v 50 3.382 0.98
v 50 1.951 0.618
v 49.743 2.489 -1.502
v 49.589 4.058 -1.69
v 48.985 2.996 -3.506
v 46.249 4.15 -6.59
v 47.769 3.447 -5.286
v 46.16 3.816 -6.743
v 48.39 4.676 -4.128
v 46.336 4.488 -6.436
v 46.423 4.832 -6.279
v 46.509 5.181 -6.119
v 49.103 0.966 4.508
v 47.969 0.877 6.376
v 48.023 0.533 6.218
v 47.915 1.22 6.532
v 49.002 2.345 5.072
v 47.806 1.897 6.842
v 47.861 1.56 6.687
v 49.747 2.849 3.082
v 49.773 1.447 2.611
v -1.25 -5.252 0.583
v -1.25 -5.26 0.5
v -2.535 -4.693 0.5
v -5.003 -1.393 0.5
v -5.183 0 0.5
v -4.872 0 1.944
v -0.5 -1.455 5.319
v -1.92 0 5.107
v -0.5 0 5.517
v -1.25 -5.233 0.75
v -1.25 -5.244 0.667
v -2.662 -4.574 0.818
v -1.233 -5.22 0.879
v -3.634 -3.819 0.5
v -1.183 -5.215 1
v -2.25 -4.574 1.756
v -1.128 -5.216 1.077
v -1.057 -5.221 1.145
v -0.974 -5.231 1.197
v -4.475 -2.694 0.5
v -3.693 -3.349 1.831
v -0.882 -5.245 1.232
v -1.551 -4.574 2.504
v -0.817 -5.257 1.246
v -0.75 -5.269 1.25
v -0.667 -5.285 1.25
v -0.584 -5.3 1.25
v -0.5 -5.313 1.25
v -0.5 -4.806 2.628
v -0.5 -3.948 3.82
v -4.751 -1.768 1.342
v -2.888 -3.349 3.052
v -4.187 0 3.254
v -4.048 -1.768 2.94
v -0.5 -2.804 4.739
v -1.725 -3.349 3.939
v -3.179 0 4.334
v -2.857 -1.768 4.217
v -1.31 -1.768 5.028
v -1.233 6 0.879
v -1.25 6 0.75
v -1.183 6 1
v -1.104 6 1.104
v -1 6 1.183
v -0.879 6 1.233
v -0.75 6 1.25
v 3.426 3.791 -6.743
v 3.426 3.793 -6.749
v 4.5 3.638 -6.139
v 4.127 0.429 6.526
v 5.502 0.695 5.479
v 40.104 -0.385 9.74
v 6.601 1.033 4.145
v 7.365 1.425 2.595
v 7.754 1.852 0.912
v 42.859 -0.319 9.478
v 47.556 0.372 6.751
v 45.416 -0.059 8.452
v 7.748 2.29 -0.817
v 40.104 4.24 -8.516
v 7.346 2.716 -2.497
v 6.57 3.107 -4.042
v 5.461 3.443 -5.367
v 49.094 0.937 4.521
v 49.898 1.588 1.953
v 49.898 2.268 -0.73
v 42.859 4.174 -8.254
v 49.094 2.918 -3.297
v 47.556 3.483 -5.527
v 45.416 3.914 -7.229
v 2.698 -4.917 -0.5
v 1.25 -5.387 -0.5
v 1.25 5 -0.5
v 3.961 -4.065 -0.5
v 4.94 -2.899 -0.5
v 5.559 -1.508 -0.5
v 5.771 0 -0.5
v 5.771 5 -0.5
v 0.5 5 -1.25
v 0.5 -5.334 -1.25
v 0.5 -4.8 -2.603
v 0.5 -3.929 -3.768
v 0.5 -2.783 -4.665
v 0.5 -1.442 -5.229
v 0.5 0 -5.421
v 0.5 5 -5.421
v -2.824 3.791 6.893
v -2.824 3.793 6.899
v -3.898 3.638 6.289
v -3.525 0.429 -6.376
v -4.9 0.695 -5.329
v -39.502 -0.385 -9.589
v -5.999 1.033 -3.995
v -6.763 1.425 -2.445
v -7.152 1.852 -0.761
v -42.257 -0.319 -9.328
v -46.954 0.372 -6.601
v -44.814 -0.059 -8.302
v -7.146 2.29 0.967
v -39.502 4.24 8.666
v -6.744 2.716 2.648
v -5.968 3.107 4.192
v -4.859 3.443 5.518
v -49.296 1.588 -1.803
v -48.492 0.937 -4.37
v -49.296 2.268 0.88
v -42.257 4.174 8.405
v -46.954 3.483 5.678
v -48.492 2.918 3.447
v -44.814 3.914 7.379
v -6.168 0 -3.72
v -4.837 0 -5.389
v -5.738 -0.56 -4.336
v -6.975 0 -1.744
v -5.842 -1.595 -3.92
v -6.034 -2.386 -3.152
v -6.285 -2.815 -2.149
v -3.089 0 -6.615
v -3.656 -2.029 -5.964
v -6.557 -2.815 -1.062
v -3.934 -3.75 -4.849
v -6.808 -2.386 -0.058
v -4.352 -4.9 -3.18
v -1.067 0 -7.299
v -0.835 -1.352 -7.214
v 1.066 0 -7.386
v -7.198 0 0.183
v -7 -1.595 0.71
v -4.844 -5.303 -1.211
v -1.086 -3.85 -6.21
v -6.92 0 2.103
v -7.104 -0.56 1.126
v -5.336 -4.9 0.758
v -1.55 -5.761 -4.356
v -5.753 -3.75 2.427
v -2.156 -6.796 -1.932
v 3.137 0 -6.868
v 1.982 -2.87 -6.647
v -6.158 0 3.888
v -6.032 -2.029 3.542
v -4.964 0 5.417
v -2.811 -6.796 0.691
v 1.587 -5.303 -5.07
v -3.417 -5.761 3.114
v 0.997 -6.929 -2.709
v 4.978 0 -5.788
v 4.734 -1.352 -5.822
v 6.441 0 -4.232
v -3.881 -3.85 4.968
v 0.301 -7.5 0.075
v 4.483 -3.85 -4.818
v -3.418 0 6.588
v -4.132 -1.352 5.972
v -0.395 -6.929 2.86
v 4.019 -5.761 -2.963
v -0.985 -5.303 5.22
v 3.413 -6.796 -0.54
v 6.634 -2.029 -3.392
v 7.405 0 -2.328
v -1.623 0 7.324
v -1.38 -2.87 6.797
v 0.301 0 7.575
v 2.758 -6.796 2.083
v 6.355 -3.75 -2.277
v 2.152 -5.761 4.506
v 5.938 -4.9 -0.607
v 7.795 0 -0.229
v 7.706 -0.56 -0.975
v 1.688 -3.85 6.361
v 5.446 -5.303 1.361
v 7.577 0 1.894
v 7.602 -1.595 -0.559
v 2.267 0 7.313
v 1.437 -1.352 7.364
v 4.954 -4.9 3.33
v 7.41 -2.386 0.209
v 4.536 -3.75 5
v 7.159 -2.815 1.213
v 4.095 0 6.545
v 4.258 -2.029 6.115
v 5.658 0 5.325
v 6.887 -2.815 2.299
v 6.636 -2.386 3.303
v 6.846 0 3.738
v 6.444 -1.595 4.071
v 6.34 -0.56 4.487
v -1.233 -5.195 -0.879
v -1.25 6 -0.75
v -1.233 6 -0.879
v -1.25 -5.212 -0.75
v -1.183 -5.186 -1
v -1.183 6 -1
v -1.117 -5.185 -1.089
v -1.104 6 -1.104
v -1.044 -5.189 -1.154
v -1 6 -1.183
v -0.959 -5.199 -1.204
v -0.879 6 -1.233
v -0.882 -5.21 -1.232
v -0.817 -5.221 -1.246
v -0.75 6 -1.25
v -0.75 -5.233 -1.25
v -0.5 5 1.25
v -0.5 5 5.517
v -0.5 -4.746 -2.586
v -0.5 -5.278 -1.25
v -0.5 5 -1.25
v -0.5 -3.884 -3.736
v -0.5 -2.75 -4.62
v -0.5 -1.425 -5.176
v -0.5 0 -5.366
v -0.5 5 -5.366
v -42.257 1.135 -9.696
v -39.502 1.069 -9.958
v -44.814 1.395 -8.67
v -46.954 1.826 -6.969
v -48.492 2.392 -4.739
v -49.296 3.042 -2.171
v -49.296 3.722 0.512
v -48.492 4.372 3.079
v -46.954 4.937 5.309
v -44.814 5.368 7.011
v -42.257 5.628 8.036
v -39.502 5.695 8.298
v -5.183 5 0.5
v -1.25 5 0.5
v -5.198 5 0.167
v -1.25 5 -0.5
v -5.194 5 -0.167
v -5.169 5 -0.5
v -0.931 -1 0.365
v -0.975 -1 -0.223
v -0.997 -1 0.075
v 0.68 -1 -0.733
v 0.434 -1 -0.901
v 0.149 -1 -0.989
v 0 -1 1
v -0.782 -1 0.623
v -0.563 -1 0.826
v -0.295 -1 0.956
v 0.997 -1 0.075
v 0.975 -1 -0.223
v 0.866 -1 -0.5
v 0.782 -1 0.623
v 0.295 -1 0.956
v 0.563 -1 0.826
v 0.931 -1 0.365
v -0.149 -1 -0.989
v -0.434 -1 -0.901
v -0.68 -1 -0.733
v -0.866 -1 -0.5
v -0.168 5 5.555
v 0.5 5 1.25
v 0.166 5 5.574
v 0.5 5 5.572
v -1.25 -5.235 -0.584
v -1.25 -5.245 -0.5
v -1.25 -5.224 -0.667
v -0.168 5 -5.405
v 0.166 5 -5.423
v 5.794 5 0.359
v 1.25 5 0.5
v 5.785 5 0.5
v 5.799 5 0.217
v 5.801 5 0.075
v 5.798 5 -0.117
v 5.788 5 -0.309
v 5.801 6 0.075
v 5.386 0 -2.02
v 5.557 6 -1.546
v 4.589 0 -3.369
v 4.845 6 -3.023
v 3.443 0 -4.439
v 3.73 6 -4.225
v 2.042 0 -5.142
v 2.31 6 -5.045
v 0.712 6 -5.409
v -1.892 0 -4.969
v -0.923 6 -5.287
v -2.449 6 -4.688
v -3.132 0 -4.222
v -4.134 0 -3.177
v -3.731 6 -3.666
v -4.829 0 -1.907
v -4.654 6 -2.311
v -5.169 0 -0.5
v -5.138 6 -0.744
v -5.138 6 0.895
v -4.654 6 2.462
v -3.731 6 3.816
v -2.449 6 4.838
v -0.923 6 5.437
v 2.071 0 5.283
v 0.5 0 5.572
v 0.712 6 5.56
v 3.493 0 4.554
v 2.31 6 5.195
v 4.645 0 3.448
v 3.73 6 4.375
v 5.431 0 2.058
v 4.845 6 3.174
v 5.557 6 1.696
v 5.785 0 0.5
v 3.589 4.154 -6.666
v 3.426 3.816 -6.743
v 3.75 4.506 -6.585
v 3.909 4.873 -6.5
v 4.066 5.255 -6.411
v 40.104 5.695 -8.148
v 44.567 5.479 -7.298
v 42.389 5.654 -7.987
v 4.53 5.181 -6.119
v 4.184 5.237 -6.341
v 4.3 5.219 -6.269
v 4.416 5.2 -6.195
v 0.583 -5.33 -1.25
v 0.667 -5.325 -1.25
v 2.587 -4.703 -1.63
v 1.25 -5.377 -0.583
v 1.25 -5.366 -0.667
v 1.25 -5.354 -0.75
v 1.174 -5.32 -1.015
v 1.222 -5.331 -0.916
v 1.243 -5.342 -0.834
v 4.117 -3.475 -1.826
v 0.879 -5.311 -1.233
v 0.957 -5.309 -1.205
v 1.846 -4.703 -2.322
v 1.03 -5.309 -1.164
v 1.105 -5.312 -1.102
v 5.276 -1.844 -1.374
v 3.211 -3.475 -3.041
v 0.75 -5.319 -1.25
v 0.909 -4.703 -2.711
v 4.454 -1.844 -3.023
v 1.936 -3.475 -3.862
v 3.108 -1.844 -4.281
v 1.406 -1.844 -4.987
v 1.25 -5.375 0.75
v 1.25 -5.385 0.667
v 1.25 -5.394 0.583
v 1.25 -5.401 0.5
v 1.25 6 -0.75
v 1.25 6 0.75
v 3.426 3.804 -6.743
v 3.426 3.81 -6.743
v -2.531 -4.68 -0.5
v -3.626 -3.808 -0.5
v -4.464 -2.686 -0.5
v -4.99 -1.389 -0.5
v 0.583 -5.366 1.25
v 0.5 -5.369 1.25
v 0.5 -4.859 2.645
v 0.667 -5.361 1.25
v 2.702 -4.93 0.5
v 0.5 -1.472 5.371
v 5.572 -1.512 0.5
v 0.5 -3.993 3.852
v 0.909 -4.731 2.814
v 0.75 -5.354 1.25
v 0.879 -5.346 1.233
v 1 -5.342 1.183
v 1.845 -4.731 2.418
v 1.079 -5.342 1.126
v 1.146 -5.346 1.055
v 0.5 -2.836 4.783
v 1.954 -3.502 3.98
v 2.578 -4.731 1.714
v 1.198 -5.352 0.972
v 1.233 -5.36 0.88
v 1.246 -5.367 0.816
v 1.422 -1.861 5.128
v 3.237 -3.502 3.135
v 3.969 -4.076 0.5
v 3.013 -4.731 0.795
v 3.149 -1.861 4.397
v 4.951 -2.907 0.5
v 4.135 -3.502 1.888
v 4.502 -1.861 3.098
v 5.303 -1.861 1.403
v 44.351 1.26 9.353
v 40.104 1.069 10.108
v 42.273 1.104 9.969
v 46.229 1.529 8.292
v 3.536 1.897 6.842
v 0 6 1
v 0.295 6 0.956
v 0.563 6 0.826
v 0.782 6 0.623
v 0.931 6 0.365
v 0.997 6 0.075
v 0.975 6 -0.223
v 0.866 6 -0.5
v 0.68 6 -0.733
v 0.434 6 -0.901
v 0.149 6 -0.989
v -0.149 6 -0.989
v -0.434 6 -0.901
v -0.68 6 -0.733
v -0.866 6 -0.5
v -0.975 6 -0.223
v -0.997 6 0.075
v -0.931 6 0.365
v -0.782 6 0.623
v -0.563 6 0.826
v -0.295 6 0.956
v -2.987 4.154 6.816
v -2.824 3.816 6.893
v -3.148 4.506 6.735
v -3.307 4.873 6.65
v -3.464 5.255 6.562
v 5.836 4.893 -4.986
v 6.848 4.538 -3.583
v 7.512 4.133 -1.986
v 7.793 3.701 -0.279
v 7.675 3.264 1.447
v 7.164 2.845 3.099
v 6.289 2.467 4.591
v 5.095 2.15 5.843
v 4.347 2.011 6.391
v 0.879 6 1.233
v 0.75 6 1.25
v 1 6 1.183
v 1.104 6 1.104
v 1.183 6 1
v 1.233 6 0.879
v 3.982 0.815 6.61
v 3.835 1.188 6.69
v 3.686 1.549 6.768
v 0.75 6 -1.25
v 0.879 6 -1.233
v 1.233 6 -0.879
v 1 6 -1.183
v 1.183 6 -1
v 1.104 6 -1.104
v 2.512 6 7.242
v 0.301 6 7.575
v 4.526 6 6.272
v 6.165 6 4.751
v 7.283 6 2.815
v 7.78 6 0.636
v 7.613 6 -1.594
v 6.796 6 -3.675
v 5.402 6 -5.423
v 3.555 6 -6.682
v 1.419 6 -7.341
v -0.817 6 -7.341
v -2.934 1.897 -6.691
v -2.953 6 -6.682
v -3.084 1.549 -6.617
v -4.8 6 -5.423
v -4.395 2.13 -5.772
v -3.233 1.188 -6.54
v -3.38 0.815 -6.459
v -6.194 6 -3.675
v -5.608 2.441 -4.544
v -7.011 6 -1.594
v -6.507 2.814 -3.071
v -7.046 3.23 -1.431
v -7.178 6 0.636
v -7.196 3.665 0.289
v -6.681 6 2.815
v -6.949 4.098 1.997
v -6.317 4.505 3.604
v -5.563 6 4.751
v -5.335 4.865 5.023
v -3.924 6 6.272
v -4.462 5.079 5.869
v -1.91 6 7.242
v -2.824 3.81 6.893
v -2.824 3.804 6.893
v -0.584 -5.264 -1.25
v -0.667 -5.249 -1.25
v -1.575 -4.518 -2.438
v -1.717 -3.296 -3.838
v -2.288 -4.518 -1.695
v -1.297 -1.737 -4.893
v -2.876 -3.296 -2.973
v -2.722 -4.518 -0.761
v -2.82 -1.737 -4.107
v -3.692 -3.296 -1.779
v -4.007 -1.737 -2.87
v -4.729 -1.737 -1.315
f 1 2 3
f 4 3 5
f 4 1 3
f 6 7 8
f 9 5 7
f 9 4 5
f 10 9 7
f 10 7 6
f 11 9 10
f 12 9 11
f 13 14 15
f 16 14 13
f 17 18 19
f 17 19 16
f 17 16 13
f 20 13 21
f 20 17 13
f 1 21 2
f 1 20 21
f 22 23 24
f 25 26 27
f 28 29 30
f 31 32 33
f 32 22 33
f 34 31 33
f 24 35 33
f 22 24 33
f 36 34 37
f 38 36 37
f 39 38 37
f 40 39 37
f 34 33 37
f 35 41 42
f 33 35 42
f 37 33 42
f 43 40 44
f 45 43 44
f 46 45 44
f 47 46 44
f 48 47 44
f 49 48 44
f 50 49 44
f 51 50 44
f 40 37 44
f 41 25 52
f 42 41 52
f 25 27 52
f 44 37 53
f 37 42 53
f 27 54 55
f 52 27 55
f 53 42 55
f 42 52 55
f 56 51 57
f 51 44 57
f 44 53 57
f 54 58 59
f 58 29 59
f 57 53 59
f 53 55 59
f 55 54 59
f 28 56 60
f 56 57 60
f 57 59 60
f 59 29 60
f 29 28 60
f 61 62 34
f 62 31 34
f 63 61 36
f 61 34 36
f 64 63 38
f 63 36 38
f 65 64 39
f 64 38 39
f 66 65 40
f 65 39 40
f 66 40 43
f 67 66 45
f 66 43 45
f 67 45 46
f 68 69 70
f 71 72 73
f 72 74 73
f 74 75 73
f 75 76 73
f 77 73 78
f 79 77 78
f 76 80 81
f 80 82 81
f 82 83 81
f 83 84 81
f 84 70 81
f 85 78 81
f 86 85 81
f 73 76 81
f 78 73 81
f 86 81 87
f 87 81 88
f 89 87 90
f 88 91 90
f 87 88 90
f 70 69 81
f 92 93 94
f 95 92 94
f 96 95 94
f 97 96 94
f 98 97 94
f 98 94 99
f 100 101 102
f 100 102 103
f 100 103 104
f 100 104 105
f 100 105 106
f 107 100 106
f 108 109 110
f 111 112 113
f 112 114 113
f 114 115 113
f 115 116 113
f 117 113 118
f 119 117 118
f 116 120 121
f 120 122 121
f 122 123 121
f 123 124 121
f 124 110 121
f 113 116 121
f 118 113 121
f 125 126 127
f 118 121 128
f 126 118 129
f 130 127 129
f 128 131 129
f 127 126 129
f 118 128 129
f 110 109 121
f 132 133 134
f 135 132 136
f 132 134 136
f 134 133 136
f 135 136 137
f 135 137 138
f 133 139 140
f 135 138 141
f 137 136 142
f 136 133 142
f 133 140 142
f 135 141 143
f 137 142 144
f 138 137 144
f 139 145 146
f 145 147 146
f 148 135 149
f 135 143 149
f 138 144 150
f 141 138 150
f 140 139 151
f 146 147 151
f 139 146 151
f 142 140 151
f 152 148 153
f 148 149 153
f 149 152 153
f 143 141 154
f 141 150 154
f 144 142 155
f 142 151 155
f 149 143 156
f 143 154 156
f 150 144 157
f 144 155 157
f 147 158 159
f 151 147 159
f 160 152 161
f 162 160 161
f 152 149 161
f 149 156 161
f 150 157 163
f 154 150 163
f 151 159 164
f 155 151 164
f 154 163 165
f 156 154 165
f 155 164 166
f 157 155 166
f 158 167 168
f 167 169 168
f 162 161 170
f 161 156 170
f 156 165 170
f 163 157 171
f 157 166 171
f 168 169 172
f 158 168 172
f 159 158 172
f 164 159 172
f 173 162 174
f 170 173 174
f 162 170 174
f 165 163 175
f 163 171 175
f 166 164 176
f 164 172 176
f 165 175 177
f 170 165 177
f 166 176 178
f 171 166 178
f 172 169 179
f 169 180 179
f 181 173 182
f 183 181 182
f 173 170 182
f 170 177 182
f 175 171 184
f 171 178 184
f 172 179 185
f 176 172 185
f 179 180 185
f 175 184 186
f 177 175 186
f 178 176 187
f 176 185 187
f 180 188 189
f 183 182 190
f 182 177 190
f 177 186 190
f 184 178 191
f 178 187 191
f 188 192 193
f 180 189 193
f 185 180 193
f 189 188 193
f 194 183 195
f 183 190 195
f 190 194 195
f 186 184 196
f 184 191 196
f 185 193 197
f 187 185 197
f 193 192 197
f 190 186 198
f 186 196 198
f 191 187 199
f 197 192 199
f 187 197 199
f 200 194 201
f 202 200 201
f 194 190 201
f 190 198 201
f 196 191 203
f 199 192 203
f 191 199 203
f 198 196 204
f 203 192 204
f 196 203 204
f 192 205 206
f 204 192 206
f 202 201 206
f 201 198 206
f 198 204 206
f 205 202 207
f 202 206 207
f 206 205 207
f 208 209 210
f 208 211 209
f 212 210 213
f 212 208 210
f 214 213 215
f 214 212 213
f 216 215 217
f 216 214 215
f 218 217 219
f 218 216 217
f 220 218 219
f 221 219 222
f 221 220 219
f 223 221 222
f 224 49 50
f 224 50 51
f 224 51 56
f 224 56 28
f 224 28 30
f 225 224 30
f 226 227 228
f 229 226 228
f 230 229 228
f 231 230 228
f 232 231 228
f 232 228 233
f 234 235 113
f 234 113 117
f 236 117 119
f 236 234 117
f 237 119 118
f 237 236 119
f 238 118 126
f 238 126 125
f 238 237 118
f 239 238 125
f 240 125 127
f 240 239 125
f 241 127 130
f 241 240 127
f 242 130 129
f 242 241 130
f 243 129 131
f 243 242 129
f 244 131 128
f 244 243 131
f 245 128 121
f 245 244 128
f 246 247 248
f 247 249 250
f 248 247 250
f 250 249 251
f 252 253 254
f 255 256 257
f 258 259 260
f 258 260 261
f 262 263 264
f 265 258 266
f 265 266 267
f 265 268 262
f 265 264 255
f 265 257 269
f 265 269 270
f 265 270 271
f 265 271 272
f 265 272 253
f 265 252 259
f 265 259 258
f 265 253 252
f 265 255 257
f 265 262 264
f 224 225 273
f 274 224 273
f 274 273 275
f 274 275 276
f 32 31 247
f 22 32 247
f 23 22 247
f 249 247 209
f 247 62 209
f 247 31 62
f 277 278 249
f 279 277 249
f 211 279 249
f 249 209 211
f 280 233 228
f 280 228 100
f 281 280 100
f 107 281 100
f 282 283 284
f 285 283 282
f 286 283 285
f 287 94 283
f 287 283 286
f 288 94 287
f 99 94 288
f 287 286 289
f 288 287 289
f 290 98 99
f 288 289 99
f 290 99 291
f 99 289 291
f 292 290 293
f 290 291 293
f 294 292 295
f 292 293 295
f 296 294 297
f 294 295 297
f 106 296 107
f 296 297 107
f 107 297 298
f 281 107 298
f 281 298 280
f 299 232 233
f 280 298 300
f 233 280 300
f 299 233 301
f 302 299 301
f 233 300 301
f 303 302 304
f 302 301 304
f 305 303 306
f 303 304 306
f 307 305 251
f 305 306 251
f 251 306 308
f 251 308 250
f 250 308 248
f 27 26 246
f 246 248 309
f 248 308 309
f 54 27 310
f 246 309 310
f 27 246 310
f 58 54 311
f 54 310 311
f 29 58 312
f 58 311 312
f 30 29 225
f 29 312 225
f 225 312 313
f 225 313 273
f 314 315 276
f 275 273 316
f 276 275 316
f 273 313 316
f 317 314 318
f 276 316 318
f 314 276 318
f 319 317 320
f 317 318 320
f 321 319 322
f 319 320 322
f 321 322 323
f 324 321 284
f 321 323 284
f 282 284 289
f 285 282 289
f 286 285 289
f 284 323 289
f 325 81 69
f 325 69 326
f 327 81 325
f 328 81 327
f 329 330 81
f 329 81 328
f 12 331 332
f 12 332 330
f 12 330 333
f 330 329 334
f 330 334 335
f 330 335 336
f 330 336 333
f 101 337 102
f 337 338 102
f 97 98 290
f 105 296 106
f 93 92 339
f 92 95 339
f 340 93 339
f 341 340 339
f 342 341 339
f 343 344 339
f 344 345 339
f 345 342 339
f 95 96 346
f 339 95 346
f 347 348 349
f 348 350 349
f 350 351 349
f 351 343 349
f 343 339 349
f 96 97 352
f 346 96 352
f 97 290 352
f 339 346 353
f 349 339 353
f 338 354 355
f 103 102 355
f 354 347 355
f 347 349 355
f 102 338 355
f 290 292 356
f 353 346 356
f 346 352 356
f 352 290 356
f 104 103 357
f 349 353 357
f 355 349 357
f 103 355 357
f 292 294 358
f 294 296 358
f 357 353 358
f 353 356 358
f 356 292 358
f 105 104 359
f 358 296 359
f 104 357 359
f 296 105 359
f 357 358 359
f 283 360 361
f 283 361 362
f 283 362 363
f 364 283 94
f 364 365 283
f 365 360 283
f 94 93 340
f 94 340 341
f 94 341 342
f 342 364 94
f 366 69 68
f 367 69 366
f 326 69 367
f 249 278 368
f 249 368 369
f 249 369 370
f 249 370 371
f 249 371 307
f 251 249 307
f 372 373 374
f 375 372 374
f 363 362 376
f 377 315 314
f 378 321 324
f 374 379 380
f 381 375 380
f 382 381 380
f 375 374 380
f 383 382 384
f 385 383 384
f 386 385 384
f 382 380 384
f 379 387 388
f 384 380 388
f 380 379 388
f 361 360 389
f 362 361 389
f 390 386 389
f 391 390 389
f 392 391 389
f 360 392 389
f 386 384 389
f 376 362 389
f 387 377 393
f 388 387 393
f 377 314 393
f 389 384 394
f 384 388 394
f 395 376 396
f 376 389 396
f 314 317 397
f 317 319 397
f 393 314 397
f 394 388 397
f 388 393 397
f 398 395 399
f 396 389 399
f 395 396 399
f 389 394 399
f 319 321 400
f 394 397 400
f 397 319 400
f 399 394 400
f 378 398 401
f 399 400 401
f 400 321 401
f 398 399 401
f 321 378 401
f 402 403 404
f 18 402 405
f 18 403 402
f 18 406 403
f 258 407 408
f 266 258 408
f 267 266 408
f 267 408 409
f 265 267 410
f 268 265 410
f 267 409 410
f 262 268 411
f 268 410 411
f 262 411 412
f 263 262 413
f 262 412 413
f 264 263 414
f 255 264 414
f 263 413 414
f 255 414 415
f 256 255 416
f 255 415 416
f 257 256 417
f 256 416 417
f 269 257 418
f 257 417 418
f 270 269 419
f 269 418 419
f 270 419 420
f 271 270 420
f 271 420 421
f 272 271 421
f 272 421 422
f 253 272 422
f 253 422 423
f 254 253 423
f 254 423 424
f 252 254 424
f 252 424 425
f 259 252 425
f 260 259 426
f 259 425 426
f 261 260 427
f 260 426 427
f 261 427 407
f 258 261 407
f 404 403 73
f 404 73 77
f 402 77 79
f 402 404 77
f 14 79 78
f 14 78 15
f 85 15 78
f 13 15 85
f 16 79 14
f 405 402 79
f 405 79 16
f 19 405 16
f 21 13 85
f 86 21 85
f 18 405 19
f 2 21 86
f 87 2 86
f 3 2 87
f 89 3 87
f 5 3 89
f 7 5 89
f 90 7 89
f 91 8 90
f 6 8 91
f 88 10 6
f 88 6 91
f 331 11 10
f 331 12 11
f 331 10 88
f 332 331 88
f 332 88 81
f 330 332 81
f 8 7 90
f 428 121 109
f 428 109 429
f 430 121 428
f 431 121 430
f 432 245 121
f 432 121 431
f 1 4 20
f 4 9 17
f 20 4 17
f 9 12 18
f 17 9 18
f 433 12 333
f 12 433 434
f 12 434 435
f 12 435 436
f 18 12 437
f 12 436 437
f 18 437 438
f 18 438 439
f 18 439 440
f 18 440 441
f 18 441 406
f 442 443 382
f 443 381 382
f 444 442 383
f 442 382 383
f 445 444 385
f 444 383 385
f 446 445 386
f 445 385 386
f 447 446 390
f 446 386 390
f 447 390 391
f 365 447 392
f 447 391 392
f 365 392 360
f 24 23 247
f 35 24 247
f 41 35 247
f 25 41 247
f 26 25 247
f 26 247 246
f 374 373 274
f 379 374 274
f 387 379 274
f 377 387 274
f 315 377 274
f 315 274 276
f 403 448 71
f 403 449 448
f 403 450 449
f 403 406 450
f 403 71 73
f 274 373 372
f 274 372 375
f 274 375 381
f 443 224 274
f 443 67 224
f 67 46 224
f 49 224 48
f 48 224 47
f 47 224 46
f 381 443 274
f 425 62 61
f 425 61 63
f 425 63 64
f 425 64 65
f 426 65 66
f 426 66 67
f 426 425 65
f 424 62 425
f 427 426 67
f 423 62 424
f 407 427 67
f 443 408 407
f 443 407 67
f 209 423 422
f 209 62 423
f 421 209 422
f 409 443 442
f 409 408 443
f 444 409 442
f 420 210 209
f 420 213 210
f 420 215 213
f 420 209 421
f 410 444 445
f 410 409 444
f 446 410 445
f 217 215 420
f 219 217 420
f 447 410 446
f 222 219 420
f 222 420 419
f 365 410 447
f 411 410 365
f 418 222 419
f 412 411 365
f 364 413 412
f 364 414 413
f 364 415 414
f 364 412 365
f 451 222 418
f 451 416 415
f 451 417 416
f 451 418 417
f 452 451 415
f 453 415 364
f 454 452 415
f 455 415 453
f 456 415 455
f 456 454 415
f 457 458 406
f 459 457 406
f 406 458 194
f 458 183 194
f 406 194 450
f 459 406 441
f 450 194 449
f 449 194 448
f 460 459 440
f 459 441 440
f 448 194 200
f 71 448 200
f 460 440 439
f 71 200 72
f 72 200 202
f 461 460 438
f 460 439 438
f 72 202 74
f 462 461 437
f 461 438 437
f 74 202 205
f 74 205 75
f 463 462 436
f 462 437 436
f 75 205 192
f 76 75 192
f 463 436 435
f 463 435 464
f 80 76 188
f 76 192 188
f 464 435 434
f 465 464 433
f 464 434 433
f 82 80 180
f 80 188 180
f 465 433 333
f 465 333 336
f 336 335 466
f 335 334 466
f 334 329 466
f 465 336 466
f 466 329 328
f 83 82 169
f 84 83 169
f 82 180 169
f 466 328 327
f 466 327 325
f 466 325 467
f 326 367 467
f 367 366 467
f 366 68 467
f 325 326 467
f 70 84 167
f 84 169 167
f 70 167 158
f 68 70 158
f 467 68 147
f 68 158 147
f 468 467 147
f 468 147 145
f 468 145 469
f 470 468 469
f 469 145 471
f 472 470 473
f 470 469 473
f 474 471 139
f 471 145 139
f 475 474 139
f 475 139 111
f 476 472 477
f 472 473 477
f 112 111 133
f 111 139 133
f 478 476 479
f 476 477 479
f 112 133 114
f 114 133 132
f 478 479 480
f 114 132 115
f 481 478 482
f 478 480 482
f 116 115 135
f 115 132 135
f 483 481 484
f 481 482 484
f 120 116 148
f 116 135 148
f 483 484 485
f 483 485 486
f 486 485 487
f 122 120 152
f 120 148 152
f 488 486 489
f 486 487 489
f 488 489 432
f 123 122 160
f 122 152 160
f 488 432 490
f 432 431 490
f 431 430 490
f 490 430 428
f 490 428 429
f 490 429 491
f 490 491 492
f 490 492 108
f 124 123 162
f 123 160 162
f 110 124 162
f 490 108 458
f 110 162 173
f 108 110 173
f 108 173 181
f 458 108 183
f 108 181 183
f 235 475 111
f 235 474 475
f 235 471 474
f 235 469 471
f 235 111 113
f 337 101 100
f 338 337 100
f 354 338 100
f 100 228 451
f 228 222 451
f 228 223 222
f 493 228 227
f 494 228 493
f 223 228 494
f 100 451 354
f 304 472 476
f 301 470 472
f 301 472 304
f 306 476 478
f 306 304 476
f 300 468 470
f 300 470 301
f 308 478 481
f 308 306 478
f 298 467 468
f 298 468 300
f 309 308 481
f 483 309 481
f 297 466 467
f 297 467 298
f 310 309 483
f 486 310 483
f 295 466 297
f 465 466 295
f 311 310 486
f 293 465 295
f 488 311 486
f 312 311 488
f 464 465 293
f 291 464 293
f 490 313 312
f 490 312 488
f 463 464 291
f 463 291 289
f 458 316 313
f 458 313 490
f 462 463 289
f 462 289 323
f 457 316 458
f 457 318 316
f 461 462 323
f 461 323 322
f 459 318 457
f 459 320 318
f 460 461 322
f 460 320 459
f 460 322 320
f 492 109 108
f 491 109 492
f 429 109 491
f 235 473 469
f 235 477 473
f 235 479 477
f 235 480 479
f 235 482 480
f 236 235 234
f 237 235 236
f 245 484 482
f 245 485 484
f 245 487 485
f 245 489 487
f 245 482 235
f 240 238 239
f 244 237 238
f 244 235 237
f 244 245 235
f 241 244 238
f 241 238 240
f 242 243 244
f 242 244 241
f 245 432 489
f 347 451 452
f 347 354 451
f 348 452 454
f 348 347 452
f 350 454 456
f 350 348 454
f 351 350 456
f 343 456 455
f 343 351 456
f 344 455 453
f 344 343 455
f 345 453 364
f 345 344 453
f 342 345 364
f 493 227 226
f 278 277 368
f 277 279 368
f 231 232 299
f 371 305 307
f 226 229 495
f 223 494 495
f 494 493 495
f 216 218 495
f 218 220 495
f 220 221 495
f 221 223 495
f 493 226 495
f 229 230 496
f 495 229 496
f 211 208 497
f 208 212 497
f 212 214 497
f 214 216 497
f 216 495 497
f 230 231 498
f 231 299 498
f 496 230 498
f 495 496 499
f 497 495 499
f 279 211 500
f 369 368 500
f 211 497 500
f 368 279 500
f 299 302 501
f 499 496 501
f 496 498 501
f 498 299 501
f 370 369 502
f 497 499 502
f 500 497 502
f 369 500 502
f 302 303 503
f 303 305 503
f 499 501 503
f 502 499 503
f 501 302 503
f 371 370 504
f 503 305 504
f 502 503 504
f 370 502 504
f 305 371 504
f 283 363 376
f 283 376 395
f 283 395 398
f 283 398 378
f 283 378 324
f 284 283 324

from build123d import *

# Parameters (mm, degrees)
SKETCH_1_R               = 7.5
EXTRUDE_1_DEPTH          = 6
EXTRUDE_2_DEPTH          = 50
EXTRUDE_3_DEPTH          = 1.5
CUT_EXTRUDE_START        = -1.5
CUT_EXTRUDE_2_DEPTH      = 1.475557967
PATTERN_CIRCULAR_1_COUNT = 2
REVOLVE_1_ANGLE          = 180
EXTRUDE_5_REACH          = 54.77
SKETCH_8_W               = 2.5
SKETCH_8_H               = 2.5
EXTRUDE_6_REACH          = 55.77
EXTRUDE_START            = -1
SKETCH_14_W              = 6.185620564
SKETCH_14_H              = 1
EXTRUDE_7_REACH          = 54.523
SKETCH_15_W              = 1
SKETCH_15_H              = 5.873847005
FILLET_1_R               = 0.5
SKETCH_16_R              = 1
CUT_EXTRUDE_5_DEPTH      = 7


# Read off the part's stored shape, not the designer's step: 切除-拉伸2, 抽壳9
with BuildPart() as part:
    # 草图1 → 凸台-拉伸1 (new body)
    with BuildSketch(Plane(origin=(0, 0, 0), x_dir=(1, 0, 0), z_dir=(0, 1, 0))):
        with Locations(Location((0.301002806, -0.075250701, 0), (0, 0, 270))):
            Circle(SKETCH_1_R)
    extrude(amount=EXTRUDE_1_DEPTH)

    # 草图2 → 凸台-拉伸2 (add)
    with BuildSketch(Plane(origin=(0, 0, 0), x_dir=(0, 0, -1), z_dir=(1, 0, 0))):
        Polygon((-6.841656071, 1.896781733), (-6.217832024, 0.532654335), (6.742880936, 3.816427212), (6.11905689, 5.18055461), align=None)
    extrude(amount=EXTRUDE_2_DEPTH)

    # 草图3 → 凸台-拉伸3 (add)
    with BuildSketch(Plane(origin=(0, 3.411230811, 0.864281714), x_dir=(1, 0, 0), z_dir=(0, 0.9693704528417939, 0.24560318637447578))):
        with BuildLine():
            Line((3.425595735, 7.47367623), (3.536085243, -6.166243606))
            Line((3.536085243, -6.166243606), (40.104138222, -9.535908549))
            ThreePointArc((40.104138222, -9.535908549), (50, -0.119655983), (40.104138222, 9.296596584))
            Line((40.104138222, 9.296596584), (3.425595735, 7.47367623))
        make_face()
    extrude_3 = extrude(amount=-EXTRUDE_3_DEPTH)

    # 切除-拉伸2 outline → 切除-拉伸2 (cut)
    with BuildSketch(Plane(origin=(0, 1.957175132, 0.495876935), x_dir=(1, 0, 0), z_dir=(0, -0.9693704528417938, -0.24560318637447576)).offset(CUT_EXTRUDE_START)):
        with BuildLine():
            Line((59.770521771, 9.535908549), (41.04011208, 9.535908549))
            ThreePointArc((41.04011208, 9.535908549), (47.402093905, 6.618605973), (50, 0.119655983))
            ThreePointArc((50, 0.119655983), (47.402093905, -6.379294008), (41.040112081, -9.296596584))
            Line((41.040112081, -9.296596584), (60.303287448, -9.296596584))
            Line((60.303287448, -9.296596584), (59.770521771, 9.535908549))
        make_face()
    extrude(amount=CUT_EXTRUDE_2_DEPTH, mode=Mode.SUBTRACT)

    # 阵列(圆周)1: 凸台-拉伸3 ×2 about axis
    pattern_circular_1_axis = Axis((0.301002806, 0, 0.075250701), (0, 1, 0))
    for i in range(1, PATTERN_CIRCULAR_1_COUNT):
        add(extrude_3.rotate(pattern_circular_1_axis, i * 360 / PATTERN_CIRCULAR_1_COUNT))

    # 草图6 → 旋转1 (revolve)
    with BuildSketch(Plane(origin=(0, 0, 0), x_dir=(1, 0, 0), z_dir=(0, 1, 0))):
        with BuildLine():
            Line((7.577071557, -1.894267889), (-6.975065945, 1.743766486))
            ThreePointArc((-6.975065945, 1.743766486), (2.120019994, 7.20081805), (7.577071557, -1.894267889))
        make_face()
    revolve(axis=Axis((7.577071557, 0, 1.894267889), (-0.9701425001453376, 0, -0.2425356250363098)), revolution_arc=REVOLVE_1_ANGLE)

    # 抽壳9 outline → 抽壳9 (revolve, cut)
    with BuildSketch(Plane(origin=(0.301002806, 0, 0.075250701), x_dir=(1, 0, 0), z_dir=(0, 0, 1))):
        with BuildLine():
            Line((5.5, 6e-09), (5.5, 6))
            Line((5.5, 6), (0, 6))
            Line((0, 6), (0, -5.5))
            ThreePointArc((0, -5.5), (3.889087299, -3.889087294), (5.5, 6e-09))
        make_face()
    revolve(axis=Axis((0.301002806, 0, 0.075250701), (0, 1, 0)), mode=Mode.SUBTRACT)

    # 草图8 → 凸台-拉伸5 (add, up to next)
    with BuildSketch(Plane(origin=(0, 6, 0), x_dir=(1, 0, 0), z_dir=(0, 1, 0)), mode=Mode.PRIVATE) as extrude_5_sk1:
        Rectangle(SKETCH_8_W, SKETCH_8_H)
    extrude_5_tool1 = extrude(extrude_5_sk1.sketch, amount=-EXTRUDE_5_REACH, mode=Mode.PRIVATE) - part.part
    add(extrude_5_tool1.solids().sort_by_distance((0, 6, 0))[0])

    # 草图14 → 凸台-拉伸6 (add, up to next)
    with BuildSketch(Plane(origin=(0, 6, 0), x_dir=(1, 0, 0), z_dir=(0, 1, 0)).offset(EXTRUDE_START), mode=Mode.PRIVATE) as extrude_6_sk1:
        with Locations((3.092810282, 0)):
            Rectangle(SKETCH_14_W, SKETCH_14_H)
    extrude_6_tool1 = extrude(extrude_6_sk1.sketch, amount=-EXTRUDE_6_REACH, mode=Mode.PRIVATE) - part.part
    extrude_6 = extrude_6_tool1.solids().sort_by_distance((3.09281, 5, 0))[0]
    add(extrude_6)

    # 镜向1: 凸台-拉伸6 across plane
    add(extrude_6.mirror(Plane(origin=(0, 0, 0), x_dir=(0, 0, 1), z_dir=(1, 0, 0))))

    # 草图15 → 凸台-拉伸7 (add, up to next)
    with BuildSketch(Plane(origin=(0, 5, 0), x_dir=(1, 0, 0), z_dir=(0, 1, 0)), mode=Mode.PRIVATE) as extrude_7_sk1:
        with Locations((0, 2.936923503)):
            Rectangle(SKETCH_15_W, SKETCH_15_H)
    extrude_7_tool1 = extrude(extrude_7_sk1.sketch, amount=-EXTRUDE_7_REACH, mode=Mode.PRIVATE) - part.part
    extrude_7 = extrude_7_tool1.solids().sort_by_distance((0, 5, -2.936924))[0]
    add(extrude_7)

    # 镜向2: 凸台-拉伸7 mirrored; each copy of 凸台-拉伸7 runs up to whatever stops it at its own place
    mirror_2_before = part.part  # the part as the pattern finds it: every copy runs up to it
    mirror_2_extrude_7_long = extrude(extrude_7_sk1.sketch, amount=-EXTRUDE_7_REACH, mode=Mode.PRIVATE)
    mirror_2_extrude_7_tool1 = mirror_2_extrude_7_long.mirror(Plane.XY) - mirror_2_before
    add(mirror_2_extrude_7_tool1.solids().sort_by_distance((0, 5, 2.936924))[0])

    # 圆角1
    fillet_1_edges = [part.edges().sort_by_distance(p)[0] for p in [
        (-1.25, 0.427824152, 1.25),
        (1.25, 0.355696292, 1.25),
        (1.25, 0.373542552, -1.25),
        (-1.25, 0.446174395, -1.25),
    ]]
    fillet(fillet_1_edges, radius=FILLET_1_R)

    # 草图16 → 切除-拉伸5 (cut)
    with BuildSketch(Plane(origin=(0, 6, 0), x_dir=(1, 0, 0), z_dir=(0, 1, 0))):
        with Locations(Location((0, 0, 0), (0, 0, 270))):
            Circle(SKETCH_16_R)
    extrude(amount=-CUT_EXTRUDE_5_DEPTH, mode=Mode.SUBTRACT)


solid = part.part
